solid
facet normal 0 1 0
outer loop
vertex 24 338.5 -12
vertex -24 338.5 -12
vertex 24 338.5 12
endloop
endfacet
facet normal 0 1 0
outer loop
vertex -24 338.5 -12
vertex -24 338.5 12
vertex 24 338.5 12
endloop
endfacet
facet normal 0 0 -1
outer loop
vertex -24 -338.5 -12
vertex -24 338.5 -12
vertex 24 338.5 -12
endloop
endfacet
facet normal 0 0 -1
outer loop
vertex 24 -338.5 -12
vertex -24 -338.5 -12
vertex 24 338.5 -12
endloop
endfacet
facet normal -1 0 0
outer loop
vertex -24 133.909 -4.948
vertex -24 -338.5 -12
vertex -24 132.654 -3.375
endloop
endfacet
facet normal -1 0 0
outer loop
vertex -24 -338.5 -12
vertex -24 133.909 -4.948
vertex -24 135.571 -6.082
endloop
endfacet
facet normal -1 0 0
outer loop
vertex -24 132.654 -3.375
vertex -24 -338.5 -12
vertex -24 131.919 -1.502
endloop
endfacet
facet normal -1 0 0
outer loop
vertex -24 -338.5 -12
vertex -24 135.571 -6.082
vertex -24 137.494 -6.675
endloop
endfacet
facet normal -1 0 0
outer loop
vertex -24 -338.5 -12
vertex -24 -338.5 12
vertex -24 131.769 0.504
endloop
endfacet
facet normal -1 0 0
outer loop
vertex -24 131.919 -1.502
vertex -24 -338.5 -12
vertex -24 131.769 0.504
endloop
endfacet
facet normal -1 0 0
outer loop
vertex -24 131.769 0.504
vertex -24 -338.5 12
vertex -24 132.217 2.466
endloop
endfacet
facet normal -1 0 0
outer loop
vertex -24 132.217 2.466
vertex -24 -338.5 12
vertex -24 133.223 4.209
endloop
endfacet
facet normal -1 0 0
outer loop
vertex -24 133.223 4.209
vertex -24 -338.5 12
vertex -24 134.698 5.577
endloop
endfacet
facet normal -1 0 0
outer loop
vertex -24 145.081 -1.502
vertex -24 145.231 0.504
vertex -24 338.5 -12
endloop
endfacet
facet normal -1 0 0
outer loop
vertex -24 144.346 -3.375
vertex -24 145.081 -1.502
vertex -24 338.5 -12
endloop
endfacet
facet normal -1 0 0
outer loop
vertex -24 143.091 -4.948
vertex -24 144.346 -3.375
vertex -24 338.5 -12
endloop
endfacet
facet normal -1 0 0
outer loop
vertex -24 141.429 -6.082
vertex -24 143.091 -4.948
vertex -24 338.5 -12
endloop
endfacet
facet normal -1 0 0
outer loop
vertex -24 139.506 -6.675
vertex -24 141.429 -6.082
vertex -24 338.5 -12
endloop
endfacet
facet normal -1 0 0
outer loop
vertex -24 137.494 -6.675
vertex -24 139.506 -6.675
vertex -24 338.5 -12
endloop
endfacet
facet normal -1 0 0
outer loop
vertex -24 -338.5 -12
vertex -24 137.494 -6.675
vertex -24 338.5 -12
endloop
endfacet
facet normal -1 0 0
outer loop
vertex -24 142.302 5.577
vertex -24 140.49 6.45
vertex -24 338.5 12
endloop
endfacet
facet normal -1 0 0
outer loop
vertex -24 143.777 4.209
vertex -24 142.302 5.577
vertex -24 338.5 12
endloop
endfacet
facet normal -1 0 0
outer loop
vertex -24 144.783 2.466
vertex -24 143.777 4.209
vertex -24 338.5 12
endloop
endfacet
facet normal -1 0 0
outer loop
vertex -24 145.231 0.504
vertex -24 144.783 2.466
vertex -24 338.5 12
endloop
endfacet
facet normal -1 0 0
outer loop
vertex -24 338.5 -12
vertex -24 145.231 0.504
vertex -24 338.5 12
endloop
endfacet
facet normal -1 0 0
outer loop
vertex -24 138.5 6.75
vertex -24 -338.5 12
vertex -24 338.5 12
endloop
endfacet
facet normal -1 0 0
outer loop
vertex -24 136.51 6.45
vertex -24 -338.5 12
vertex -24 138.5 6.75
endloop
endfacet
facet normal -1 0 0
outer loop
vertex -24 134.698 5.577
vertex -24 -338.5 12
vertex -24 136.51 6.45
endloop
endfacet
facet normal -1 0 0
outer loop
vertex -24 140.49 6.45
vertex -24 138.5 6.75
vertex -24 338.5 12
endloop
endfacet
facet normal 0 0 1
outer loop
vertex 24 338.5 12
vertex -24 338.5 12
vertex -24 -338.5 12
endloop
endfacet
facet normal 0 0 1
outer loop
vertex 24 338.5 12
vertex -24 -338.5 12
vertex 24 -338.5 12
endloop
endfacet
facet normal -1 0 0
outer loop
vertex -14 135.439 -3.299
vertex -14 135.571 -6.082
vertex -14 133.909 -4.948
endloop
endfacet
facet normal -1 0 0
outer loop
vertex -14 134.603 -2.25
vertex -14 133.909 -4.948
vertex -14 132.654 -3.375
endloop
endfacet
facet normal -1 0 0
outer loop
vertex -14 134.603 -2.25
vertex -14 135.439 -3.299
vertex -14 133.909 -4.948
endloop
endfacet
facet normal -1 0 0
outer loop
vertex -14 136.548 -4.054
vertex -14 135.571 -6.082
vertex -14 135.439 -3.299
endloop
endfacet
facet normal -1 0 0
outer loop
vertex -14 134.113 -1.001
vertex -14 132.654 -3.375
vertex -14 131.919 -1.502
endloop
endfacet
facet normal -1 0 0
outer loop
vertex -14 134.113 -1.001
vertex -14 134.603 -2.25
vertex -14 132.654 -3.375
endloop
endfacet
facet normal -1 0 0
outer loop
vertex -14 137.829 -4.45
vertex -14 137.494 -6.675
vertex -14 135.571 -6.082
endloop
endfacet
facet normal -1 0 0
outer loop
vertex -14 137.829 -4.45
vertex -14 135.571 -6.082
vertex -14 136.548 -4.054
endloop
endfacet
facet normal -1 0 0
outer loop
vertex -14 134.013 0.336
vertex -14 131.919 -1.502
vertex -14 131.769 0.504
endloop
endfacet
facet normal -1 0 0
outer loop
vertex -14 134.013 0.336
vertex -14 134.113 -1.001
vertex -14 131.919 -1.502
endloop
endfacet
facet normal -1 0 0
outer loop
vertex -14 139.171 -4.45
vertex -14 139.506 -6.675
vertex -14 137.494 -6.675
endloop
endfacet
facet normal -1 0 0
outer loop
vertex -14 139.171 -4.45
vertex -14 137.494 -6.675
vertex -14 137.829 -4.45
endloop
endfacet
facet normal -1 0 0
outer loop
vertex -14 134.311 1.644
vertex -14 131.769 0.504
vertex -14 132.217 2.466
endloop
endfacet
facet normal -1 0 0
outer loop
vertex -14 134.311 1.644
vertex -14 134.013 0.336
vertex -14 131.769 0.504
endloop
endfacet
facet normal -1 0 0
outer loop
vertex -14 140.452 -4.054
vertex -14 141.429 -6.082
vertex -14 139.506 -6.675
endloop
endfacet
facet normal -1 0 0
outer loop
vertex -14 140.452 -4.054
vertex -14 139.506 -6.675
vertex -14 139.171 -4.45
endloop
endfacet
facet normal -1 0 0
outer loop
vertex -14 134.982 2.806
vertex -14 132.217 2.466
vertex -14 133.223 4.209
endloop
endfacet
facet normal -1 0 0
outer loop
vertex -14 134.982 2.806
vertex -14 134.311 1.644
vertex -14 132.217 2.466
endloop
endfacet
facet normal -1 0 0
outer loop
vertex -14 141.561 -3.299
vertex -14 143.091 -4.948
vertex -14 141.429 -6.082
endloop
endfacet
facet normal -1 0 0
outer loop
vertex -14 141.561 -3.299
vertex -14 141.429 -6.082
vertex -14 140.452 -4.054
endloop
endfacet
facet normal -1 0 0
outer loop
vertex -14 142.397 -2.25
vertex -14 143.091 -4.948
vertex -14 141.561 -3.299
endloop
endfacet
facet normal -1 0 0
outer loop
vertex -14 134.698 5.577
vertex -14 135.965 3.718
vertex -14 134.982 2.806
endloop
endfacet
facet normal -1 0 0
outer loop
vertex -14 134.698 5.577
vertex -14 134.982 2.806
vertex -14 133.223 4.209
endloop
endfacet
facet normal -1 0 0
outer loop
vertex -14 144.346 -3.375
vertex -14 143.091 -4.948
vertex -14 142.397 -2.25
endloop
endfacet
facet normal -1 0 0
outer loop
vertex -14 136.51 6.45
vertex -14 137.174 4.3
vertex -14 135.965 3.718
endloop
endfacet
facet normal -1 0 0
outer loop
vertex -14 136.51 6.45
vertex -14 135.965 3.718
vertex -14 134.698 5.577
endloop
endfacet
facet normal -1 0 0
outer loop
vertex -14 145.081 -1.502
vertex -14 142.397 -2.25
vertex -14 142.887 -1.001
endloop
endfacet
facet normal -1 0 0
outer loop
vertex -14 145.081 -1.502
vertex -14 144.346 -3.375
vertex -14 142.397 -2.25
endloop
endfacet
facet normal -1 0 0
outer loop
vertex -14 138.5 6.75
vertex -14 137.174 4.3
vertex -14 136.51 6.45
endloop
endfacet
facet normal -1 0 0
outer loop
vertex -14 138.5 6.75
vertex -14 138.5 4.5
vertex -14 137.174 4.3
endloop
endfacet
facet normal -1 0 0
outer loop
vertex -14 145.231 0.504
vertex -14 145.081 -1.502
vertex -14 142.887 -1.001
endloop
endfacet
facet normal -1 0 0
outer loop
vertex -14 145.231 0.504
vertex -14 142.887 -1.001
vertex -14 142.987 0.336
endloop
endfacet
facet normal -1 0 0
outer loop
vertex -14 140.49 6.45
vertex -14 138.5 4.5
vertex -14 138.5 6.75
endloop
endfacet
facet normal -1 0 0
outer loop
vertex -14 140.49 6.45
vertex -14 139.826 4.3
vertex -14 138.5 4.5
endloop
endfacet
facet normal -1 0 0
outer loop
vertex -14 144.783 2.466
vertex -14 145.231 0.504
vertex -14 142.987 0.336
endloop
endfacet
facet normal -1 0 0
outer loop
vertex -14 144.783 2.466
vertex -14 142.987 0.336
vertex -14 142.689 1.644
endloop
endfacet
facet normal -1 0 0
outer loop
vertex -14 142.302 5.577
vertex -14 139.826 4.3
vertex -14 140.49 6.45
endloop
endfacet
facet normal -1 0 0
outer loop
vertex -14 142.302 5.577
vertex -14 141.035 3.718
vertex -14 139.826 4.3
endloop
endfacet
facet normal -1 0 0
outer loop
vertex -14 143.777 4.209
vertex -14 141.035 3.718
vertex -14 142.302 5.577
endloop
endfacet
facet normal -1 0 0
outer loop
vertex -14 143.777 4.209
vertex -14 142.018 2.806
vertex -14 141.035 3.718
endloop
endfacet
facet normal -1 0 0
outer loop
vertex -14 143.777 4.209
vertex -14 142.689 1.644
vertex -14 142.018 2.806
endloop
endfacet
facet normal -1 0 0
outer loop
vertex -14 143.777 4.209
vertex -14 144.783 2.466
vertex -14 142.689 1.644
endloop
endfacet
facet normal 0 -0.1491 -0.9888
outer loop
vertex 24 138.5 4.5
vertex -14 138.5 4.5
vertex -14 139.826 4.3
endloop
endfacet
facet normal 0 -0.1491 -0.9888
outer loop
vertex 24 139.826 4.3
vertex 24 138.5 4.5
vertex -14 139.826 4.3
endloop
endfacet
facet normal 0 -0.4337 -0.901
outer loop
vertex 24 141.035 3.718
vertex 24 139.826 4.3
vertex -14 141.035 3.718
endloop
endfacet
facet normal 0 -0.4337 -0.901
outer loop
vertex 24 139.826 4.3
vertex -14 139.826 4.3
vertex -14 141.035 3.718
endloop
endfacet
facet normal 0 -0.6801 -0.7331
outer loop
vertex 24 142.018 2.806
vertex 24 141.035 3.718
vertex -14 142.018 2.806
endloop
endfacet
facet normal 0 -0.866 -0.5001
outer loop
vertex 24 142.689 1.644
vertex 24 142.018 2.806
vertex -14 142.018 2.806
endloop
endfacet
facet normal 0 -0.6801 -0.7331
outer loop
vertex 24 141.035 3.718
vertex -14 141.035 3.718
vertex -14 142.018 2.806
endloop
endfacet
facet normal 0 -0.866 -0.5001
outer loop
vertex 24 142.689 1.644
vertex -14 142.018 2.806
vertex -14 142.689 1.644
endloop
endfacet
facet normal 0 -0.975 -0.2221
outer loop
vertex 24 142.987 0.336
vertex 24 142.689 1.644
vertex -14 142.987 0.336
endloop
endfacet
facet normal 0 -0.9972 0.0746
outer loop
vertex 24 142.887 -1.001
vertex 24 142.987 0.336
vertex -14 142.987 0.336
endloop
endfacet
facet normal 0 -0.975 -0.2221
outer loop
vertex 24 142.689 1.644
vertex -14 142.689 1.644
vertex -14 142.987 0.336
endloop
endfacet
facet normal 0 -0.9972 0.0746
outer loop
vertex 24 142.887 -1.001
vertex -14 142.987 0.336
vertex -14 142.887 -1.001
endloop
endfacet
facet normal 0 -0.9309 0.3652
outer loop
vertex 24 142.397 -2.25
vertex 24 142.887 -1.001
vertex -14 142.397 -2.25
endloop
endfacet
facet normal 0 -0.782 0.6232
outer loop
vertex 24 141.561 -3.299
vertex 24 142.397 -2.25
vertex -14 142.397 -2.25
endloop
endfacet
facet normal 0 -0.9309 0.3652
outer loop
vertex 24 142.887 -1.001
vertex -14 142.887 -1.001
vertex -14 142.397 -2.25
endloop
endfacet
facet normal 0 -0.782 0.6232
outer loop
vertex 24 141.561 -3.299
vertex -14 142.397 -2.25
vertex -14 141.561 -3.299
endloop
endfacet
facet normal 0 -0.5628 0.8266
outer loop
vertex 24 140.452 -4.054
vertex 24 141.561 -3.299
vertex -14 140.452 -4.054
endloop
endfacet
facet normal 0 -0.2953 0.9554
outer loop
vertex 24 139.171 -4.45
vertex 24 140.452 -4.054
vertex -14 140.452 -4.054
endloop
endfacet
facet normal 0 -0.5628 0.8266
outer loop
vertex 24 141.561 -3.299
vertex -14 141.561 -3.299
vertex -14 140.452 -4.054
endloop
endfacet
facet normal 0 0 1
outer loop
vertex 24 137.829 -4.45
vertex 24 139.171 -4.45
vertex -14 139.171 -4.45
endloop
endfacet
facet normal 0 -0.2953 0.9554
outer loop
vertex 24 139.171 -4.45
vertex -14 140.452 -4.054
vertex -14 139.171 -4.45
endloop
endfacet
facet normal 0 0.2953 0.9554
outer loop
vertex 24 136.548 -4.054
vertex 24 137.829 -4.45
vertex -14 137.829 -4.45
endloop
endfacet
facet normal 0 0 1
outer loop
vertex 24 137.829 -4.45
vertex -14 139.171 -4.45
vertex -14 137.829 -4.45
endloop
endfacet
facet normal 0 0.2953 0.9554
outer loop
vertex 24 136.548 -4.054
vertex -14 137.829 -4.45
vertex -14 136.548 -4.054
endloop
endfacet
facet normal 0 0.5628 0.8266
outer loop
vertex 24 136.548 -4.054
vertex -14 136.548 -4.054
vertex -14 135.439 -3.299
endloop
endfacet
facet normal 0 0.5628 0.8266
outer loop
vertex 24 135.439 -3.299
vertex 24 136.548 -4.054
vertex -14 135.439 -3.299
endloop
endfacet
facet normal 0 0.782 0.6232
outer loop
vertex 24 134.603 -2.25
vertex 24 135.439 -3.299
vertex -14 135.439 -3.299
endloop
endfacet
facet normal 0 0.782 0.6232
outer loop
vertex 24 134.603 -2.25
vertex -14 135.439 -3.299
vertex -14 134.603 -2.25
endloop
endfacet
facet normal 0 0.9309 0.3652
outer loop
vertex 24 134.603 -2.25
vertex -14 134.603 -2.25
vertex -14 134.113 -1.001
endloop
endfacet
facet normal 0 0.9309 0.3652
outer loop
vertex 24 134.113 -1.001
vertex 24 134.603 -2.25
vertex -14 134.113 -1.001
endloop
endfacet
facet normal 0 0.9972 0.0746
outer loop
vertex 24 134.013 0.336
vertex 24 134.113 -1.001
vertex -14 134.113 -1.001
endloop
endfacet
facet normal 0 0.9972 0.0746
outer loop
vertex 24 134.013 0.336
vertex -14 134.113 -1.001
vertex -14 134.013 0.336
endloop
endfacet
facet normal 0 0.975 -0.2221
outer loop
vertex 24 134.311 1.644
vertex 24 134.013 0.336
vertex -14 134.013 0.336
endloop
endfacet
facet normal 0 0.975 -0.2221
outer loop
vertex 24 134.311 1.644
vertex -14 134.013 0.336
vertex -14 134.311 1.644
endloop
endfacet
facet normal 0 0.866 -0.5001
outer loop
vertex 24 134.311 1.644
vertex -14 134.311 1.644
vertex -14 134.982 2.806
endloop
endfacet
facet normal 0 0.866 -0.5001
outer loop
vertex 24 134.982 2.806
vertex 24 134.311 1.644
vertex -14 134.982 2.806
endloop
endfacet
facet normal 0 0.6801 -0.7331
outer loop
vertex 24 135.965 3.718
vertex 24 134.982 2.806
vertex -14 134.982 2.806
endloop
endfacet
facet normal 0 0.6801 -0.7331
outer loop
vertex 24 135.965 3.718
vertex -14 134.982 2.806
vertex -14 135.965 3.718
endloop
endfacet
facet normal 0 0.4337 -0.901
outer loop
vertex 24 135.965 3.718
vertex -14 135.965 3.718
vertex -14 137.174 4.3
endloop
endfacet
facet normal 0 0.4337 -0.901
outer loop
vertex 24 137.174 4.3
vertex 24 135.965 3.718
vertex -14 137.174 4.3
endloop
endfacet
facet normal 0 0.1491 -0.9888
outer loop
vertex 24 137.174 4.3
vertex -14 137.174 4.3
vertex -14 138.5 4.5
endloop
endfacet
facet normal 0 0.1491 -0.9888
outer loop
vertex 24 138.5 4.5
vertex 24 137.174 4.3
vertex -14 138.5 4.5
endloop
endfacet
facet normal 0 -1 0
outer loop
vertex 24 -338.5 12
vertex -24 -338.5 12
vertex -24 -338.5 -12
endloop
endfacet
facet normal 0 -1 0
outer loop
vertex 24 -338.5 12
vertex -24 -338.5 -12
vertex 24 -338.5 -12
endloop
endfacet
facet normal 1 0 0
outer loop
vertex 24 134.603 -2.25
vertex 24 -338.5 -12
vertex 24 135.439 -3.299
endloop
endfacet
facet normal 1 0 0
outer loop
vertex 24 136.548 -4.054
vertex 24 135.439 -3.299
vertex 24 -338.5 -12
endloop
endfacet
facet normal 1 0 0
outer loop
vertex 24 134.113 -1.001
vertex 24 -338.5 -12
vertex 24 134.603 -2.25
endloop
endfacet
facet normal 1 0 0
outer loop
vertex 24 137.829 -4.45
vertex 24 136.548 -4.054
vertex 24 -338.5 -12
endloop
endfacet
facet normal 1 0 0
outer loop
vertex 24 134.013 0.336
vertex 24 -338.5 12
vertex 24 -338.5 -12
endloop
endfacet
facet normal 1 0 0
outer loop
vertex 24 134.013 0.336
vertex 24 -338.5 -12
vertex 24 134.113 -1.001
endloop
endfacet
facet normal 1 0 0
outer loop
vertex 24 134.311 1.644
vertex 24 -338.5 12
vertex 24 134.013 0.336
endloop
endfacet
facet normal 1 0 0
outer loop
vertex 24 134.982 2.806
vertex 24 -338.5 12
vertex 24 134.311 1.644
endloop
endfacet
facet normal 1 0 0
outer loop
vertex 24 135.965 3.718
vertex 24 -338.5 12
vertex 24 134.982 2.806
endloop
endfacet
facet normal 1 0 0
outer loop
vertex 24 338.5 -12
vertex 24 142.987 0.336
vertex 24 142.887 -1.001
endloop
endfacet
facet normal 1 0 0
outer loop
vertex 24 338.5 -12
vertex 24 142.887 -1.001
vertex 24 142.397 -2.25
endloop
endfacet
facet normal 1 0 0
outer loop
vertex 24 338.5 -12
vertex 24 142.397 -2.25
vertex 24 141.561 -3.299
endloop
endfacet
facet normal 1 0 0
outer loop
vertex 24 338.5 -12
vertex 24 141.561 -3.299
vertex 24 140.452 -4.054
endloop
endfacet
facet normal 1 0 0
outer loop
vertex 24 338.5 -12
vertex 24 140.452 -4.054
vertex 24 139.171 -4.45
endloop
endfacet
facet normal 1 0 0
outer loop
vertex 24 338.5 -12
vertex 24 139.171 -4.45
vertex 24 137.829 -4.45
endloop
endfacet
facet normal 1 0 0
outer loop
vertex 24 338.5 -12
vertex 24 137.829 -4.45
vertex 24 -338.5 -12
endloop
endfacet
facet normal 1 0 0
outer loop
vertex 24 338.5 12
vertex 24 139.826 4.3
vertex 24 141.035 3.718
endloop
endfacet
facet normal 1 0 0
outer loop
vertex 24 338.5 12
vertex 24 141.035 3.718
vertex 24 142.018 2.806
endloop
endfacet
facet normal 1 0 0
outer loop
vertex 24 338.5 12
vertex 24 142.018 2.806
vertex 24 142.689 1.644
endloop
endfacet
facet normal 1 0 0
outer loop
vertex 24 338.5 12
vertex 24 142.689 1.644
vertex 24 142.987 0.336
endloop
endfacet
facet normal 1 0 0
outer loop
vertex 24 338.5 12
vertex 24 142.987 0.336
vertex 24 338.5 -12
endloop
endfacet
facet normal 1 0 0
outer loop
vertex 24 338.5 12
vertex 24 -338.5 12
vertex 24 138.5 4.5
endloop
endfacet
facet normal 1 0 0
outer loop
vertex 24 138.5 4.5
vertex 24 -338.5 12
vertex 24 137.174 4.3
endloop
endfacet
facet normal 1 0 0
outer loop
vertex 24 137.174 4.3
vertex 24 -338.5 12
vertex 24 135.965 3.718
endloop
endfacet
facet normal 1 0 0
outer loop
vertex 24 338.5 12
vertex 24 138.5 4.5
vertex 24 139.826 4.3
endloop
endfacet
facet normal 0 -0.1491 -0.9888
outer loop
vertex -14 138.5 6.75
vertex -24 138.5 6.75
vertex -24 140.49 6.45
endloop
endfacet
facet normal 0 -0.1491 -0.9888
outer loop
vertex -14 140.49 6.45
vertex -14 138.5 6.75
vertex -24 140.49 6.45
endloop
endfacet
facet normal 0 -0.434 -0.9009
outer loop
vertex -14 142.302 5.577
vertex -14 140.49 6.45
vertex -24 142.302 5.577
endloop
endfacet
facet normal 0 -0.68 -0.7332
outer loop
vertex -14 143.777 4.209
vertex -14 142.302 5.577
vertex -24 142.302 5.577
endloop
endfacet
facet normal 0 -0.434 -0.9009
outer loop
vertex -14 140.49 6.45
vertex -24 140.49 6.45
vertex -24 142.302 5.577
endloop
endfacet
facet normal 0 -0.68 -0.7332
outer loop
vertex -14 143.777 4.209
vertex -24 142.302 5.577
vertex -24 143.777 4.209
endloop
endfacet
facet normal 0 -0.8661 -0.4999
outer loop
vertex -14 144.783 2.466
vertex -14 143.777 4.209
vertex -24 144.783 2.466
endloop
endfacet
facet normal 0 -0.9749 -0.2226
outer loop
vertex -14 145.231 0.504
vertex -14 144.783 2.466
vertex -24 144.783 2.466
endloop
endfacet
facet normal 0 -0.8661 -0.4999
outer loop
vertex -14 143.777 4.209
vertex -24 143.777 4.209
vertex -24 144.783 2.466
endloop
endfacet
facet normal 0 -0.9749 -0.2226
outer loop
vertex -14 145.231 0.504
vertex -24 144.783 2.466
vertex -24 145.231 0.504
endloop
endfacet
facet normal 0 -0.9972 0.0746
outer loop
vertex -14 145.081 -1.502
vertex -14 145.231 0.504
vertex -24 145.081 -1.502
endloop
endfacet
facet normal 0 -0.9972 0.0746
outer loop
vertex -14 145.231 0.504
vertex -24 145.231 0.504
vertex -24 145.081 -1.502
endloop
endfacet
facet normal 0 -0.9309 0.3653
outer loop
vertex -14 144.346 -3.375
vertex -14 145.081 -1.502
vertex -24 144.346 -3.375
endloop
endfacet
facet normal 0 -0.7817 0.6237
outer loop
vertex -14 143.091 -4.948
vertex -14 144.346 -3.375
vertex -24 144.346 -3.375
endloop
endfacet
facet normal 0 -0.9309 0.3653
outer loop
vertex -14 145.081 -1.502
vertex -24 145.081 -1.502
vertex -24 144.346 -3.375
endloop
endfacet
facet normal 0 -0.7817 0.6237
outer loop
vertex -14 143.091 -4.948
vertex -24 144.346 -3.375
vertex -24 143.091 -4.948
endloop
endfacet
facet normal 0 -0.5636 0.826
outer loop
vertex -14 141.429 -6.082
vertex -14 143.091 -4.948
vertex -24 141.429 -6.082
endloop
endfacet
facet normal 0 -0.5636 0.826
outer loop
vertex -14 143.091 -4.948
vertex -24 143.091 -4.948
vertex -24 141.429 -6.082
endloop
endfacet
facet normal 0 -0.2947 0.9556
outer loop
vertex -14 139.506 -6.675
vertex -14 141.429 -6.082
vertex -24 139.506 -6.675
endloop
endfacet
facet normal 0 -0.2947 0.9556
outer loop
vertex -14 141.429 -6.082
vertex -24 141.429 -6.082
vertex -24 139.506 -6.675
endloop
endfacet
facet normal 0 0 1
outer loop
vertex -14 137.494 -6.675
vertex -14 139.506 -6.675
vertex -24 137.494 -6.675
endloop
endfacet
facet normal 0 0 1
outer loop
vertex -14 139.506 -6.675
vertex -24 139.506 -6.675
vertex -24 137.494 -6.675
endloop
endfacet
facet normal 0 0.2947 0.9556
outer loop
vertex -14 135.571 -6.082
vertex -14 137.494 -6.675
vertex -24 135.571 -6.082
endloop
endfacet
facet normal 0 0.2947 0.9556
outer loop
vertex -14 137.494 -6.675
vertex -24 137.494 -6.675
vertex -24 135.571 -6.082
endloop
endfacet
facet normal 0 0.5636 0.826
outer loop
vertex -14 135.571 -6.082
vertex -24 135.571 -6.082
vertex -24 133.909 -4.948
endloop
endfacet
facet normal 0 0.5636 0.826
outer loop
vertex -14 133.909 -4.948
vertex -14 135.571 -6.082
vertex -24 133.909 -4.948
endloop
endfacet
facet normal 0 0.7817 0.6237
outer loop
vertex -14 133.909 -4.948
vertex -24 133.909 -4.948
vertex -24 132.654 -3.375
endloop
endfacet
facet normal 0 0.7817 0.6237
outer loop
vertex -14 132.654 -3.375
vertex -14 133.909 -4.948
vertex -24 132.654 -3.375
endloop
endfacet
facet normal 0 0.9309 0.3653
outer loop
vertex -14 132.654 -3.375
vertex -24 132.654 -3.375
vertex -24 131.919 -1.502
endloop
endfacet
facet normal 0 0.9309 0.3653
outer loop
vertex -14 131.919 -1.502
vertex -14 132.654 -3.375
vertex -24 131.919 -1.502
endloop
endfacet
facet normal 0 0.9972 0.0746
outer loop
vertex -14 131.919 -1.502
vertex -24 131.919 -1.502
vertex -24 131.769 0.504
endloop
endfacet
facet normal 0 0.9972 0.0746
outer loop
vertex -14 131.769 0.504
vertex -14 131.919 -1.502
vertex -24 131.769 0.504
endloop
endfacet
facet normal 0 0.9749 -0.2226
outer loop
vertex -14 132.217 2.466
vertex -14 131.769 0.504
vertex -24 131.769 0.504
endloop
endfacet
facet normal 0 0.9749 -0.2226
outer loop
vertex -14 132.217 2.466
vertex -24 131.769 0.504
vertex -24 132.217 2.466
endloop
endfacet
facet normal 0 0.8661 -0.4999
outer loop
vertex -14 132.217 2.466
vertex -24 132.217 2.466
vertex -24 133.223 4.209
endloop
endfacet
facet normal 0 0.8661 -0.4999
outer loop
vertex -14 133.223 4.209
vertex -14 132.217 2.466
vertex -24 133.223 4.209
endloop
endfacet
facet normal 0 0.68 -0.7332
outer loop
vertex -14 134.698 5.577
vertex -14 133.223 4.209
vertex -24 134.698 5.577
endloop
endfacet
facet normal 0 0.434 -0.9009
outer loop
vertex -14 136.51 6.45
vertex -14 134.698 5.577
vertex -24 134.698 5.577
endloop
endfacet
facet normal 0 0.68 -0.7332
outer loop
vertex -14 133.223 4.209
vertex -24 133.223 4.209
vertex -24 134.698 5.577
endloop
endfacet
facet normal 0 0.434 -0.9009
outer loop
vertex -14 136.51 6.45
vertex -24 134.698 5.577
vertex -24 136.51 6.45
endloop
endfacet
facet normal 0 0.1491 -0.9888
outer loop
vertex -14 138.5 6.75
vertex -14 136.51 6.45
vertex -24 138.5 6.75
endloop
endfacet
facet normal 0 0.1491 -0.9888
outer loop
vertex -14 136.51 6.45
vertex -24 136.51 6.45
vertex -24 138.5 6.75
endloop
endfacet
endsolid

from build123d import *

# Parameters (mm, degrees)
ESQUISSE1_W             = 48
ESQUISSE1_H             = 677
BOSS_EXTRU_1_DEPTH      = 12
ESQUISSE3_R             = 4.5
ENL_V_MAT_EXTRU_2_DEPTH = 343.096843014
ESQUISSE5_R             = 6.75
ENL_V_MAT_EXTRU_4_DEPTH = 10


with BuildPart() as part:
    # Esquisse1 → Boss.-Extru.1 (new, symmetric)
    with BuildSketch(Plane.XY):
        Rectangle(ESQUISSE1_W, ESQUISSE1_H)
    extrude(amount=BOSS_EXTRU_1_DEPTH, both=True)

    # Esquisse3 → Enlèv. mat.-Extru.2 (cut, through all)
    with BuildSketch(Plane.ZY.offset(24)):
        with Locations((0, 138.5)):
            Circle(ESQUISSE3_R)
    extrude(amount=-ENL_V_MAT_EXTRU_2_DEPTH, mode=Mode.SUBTRACT)

    # Esquisse5 → Enlèv. mat.-Extru.4 (cut)
    with BuildSketch(Plane.ZY.offset(24)):
        with Locations((0, 138.5)):
            Circle(ESQUISSE5_R)
    extrude(amount=-ENL_V_MAT_EXTRU_4_DEPTH, mode=Mode.SUBTRACT)


solid = part.part
